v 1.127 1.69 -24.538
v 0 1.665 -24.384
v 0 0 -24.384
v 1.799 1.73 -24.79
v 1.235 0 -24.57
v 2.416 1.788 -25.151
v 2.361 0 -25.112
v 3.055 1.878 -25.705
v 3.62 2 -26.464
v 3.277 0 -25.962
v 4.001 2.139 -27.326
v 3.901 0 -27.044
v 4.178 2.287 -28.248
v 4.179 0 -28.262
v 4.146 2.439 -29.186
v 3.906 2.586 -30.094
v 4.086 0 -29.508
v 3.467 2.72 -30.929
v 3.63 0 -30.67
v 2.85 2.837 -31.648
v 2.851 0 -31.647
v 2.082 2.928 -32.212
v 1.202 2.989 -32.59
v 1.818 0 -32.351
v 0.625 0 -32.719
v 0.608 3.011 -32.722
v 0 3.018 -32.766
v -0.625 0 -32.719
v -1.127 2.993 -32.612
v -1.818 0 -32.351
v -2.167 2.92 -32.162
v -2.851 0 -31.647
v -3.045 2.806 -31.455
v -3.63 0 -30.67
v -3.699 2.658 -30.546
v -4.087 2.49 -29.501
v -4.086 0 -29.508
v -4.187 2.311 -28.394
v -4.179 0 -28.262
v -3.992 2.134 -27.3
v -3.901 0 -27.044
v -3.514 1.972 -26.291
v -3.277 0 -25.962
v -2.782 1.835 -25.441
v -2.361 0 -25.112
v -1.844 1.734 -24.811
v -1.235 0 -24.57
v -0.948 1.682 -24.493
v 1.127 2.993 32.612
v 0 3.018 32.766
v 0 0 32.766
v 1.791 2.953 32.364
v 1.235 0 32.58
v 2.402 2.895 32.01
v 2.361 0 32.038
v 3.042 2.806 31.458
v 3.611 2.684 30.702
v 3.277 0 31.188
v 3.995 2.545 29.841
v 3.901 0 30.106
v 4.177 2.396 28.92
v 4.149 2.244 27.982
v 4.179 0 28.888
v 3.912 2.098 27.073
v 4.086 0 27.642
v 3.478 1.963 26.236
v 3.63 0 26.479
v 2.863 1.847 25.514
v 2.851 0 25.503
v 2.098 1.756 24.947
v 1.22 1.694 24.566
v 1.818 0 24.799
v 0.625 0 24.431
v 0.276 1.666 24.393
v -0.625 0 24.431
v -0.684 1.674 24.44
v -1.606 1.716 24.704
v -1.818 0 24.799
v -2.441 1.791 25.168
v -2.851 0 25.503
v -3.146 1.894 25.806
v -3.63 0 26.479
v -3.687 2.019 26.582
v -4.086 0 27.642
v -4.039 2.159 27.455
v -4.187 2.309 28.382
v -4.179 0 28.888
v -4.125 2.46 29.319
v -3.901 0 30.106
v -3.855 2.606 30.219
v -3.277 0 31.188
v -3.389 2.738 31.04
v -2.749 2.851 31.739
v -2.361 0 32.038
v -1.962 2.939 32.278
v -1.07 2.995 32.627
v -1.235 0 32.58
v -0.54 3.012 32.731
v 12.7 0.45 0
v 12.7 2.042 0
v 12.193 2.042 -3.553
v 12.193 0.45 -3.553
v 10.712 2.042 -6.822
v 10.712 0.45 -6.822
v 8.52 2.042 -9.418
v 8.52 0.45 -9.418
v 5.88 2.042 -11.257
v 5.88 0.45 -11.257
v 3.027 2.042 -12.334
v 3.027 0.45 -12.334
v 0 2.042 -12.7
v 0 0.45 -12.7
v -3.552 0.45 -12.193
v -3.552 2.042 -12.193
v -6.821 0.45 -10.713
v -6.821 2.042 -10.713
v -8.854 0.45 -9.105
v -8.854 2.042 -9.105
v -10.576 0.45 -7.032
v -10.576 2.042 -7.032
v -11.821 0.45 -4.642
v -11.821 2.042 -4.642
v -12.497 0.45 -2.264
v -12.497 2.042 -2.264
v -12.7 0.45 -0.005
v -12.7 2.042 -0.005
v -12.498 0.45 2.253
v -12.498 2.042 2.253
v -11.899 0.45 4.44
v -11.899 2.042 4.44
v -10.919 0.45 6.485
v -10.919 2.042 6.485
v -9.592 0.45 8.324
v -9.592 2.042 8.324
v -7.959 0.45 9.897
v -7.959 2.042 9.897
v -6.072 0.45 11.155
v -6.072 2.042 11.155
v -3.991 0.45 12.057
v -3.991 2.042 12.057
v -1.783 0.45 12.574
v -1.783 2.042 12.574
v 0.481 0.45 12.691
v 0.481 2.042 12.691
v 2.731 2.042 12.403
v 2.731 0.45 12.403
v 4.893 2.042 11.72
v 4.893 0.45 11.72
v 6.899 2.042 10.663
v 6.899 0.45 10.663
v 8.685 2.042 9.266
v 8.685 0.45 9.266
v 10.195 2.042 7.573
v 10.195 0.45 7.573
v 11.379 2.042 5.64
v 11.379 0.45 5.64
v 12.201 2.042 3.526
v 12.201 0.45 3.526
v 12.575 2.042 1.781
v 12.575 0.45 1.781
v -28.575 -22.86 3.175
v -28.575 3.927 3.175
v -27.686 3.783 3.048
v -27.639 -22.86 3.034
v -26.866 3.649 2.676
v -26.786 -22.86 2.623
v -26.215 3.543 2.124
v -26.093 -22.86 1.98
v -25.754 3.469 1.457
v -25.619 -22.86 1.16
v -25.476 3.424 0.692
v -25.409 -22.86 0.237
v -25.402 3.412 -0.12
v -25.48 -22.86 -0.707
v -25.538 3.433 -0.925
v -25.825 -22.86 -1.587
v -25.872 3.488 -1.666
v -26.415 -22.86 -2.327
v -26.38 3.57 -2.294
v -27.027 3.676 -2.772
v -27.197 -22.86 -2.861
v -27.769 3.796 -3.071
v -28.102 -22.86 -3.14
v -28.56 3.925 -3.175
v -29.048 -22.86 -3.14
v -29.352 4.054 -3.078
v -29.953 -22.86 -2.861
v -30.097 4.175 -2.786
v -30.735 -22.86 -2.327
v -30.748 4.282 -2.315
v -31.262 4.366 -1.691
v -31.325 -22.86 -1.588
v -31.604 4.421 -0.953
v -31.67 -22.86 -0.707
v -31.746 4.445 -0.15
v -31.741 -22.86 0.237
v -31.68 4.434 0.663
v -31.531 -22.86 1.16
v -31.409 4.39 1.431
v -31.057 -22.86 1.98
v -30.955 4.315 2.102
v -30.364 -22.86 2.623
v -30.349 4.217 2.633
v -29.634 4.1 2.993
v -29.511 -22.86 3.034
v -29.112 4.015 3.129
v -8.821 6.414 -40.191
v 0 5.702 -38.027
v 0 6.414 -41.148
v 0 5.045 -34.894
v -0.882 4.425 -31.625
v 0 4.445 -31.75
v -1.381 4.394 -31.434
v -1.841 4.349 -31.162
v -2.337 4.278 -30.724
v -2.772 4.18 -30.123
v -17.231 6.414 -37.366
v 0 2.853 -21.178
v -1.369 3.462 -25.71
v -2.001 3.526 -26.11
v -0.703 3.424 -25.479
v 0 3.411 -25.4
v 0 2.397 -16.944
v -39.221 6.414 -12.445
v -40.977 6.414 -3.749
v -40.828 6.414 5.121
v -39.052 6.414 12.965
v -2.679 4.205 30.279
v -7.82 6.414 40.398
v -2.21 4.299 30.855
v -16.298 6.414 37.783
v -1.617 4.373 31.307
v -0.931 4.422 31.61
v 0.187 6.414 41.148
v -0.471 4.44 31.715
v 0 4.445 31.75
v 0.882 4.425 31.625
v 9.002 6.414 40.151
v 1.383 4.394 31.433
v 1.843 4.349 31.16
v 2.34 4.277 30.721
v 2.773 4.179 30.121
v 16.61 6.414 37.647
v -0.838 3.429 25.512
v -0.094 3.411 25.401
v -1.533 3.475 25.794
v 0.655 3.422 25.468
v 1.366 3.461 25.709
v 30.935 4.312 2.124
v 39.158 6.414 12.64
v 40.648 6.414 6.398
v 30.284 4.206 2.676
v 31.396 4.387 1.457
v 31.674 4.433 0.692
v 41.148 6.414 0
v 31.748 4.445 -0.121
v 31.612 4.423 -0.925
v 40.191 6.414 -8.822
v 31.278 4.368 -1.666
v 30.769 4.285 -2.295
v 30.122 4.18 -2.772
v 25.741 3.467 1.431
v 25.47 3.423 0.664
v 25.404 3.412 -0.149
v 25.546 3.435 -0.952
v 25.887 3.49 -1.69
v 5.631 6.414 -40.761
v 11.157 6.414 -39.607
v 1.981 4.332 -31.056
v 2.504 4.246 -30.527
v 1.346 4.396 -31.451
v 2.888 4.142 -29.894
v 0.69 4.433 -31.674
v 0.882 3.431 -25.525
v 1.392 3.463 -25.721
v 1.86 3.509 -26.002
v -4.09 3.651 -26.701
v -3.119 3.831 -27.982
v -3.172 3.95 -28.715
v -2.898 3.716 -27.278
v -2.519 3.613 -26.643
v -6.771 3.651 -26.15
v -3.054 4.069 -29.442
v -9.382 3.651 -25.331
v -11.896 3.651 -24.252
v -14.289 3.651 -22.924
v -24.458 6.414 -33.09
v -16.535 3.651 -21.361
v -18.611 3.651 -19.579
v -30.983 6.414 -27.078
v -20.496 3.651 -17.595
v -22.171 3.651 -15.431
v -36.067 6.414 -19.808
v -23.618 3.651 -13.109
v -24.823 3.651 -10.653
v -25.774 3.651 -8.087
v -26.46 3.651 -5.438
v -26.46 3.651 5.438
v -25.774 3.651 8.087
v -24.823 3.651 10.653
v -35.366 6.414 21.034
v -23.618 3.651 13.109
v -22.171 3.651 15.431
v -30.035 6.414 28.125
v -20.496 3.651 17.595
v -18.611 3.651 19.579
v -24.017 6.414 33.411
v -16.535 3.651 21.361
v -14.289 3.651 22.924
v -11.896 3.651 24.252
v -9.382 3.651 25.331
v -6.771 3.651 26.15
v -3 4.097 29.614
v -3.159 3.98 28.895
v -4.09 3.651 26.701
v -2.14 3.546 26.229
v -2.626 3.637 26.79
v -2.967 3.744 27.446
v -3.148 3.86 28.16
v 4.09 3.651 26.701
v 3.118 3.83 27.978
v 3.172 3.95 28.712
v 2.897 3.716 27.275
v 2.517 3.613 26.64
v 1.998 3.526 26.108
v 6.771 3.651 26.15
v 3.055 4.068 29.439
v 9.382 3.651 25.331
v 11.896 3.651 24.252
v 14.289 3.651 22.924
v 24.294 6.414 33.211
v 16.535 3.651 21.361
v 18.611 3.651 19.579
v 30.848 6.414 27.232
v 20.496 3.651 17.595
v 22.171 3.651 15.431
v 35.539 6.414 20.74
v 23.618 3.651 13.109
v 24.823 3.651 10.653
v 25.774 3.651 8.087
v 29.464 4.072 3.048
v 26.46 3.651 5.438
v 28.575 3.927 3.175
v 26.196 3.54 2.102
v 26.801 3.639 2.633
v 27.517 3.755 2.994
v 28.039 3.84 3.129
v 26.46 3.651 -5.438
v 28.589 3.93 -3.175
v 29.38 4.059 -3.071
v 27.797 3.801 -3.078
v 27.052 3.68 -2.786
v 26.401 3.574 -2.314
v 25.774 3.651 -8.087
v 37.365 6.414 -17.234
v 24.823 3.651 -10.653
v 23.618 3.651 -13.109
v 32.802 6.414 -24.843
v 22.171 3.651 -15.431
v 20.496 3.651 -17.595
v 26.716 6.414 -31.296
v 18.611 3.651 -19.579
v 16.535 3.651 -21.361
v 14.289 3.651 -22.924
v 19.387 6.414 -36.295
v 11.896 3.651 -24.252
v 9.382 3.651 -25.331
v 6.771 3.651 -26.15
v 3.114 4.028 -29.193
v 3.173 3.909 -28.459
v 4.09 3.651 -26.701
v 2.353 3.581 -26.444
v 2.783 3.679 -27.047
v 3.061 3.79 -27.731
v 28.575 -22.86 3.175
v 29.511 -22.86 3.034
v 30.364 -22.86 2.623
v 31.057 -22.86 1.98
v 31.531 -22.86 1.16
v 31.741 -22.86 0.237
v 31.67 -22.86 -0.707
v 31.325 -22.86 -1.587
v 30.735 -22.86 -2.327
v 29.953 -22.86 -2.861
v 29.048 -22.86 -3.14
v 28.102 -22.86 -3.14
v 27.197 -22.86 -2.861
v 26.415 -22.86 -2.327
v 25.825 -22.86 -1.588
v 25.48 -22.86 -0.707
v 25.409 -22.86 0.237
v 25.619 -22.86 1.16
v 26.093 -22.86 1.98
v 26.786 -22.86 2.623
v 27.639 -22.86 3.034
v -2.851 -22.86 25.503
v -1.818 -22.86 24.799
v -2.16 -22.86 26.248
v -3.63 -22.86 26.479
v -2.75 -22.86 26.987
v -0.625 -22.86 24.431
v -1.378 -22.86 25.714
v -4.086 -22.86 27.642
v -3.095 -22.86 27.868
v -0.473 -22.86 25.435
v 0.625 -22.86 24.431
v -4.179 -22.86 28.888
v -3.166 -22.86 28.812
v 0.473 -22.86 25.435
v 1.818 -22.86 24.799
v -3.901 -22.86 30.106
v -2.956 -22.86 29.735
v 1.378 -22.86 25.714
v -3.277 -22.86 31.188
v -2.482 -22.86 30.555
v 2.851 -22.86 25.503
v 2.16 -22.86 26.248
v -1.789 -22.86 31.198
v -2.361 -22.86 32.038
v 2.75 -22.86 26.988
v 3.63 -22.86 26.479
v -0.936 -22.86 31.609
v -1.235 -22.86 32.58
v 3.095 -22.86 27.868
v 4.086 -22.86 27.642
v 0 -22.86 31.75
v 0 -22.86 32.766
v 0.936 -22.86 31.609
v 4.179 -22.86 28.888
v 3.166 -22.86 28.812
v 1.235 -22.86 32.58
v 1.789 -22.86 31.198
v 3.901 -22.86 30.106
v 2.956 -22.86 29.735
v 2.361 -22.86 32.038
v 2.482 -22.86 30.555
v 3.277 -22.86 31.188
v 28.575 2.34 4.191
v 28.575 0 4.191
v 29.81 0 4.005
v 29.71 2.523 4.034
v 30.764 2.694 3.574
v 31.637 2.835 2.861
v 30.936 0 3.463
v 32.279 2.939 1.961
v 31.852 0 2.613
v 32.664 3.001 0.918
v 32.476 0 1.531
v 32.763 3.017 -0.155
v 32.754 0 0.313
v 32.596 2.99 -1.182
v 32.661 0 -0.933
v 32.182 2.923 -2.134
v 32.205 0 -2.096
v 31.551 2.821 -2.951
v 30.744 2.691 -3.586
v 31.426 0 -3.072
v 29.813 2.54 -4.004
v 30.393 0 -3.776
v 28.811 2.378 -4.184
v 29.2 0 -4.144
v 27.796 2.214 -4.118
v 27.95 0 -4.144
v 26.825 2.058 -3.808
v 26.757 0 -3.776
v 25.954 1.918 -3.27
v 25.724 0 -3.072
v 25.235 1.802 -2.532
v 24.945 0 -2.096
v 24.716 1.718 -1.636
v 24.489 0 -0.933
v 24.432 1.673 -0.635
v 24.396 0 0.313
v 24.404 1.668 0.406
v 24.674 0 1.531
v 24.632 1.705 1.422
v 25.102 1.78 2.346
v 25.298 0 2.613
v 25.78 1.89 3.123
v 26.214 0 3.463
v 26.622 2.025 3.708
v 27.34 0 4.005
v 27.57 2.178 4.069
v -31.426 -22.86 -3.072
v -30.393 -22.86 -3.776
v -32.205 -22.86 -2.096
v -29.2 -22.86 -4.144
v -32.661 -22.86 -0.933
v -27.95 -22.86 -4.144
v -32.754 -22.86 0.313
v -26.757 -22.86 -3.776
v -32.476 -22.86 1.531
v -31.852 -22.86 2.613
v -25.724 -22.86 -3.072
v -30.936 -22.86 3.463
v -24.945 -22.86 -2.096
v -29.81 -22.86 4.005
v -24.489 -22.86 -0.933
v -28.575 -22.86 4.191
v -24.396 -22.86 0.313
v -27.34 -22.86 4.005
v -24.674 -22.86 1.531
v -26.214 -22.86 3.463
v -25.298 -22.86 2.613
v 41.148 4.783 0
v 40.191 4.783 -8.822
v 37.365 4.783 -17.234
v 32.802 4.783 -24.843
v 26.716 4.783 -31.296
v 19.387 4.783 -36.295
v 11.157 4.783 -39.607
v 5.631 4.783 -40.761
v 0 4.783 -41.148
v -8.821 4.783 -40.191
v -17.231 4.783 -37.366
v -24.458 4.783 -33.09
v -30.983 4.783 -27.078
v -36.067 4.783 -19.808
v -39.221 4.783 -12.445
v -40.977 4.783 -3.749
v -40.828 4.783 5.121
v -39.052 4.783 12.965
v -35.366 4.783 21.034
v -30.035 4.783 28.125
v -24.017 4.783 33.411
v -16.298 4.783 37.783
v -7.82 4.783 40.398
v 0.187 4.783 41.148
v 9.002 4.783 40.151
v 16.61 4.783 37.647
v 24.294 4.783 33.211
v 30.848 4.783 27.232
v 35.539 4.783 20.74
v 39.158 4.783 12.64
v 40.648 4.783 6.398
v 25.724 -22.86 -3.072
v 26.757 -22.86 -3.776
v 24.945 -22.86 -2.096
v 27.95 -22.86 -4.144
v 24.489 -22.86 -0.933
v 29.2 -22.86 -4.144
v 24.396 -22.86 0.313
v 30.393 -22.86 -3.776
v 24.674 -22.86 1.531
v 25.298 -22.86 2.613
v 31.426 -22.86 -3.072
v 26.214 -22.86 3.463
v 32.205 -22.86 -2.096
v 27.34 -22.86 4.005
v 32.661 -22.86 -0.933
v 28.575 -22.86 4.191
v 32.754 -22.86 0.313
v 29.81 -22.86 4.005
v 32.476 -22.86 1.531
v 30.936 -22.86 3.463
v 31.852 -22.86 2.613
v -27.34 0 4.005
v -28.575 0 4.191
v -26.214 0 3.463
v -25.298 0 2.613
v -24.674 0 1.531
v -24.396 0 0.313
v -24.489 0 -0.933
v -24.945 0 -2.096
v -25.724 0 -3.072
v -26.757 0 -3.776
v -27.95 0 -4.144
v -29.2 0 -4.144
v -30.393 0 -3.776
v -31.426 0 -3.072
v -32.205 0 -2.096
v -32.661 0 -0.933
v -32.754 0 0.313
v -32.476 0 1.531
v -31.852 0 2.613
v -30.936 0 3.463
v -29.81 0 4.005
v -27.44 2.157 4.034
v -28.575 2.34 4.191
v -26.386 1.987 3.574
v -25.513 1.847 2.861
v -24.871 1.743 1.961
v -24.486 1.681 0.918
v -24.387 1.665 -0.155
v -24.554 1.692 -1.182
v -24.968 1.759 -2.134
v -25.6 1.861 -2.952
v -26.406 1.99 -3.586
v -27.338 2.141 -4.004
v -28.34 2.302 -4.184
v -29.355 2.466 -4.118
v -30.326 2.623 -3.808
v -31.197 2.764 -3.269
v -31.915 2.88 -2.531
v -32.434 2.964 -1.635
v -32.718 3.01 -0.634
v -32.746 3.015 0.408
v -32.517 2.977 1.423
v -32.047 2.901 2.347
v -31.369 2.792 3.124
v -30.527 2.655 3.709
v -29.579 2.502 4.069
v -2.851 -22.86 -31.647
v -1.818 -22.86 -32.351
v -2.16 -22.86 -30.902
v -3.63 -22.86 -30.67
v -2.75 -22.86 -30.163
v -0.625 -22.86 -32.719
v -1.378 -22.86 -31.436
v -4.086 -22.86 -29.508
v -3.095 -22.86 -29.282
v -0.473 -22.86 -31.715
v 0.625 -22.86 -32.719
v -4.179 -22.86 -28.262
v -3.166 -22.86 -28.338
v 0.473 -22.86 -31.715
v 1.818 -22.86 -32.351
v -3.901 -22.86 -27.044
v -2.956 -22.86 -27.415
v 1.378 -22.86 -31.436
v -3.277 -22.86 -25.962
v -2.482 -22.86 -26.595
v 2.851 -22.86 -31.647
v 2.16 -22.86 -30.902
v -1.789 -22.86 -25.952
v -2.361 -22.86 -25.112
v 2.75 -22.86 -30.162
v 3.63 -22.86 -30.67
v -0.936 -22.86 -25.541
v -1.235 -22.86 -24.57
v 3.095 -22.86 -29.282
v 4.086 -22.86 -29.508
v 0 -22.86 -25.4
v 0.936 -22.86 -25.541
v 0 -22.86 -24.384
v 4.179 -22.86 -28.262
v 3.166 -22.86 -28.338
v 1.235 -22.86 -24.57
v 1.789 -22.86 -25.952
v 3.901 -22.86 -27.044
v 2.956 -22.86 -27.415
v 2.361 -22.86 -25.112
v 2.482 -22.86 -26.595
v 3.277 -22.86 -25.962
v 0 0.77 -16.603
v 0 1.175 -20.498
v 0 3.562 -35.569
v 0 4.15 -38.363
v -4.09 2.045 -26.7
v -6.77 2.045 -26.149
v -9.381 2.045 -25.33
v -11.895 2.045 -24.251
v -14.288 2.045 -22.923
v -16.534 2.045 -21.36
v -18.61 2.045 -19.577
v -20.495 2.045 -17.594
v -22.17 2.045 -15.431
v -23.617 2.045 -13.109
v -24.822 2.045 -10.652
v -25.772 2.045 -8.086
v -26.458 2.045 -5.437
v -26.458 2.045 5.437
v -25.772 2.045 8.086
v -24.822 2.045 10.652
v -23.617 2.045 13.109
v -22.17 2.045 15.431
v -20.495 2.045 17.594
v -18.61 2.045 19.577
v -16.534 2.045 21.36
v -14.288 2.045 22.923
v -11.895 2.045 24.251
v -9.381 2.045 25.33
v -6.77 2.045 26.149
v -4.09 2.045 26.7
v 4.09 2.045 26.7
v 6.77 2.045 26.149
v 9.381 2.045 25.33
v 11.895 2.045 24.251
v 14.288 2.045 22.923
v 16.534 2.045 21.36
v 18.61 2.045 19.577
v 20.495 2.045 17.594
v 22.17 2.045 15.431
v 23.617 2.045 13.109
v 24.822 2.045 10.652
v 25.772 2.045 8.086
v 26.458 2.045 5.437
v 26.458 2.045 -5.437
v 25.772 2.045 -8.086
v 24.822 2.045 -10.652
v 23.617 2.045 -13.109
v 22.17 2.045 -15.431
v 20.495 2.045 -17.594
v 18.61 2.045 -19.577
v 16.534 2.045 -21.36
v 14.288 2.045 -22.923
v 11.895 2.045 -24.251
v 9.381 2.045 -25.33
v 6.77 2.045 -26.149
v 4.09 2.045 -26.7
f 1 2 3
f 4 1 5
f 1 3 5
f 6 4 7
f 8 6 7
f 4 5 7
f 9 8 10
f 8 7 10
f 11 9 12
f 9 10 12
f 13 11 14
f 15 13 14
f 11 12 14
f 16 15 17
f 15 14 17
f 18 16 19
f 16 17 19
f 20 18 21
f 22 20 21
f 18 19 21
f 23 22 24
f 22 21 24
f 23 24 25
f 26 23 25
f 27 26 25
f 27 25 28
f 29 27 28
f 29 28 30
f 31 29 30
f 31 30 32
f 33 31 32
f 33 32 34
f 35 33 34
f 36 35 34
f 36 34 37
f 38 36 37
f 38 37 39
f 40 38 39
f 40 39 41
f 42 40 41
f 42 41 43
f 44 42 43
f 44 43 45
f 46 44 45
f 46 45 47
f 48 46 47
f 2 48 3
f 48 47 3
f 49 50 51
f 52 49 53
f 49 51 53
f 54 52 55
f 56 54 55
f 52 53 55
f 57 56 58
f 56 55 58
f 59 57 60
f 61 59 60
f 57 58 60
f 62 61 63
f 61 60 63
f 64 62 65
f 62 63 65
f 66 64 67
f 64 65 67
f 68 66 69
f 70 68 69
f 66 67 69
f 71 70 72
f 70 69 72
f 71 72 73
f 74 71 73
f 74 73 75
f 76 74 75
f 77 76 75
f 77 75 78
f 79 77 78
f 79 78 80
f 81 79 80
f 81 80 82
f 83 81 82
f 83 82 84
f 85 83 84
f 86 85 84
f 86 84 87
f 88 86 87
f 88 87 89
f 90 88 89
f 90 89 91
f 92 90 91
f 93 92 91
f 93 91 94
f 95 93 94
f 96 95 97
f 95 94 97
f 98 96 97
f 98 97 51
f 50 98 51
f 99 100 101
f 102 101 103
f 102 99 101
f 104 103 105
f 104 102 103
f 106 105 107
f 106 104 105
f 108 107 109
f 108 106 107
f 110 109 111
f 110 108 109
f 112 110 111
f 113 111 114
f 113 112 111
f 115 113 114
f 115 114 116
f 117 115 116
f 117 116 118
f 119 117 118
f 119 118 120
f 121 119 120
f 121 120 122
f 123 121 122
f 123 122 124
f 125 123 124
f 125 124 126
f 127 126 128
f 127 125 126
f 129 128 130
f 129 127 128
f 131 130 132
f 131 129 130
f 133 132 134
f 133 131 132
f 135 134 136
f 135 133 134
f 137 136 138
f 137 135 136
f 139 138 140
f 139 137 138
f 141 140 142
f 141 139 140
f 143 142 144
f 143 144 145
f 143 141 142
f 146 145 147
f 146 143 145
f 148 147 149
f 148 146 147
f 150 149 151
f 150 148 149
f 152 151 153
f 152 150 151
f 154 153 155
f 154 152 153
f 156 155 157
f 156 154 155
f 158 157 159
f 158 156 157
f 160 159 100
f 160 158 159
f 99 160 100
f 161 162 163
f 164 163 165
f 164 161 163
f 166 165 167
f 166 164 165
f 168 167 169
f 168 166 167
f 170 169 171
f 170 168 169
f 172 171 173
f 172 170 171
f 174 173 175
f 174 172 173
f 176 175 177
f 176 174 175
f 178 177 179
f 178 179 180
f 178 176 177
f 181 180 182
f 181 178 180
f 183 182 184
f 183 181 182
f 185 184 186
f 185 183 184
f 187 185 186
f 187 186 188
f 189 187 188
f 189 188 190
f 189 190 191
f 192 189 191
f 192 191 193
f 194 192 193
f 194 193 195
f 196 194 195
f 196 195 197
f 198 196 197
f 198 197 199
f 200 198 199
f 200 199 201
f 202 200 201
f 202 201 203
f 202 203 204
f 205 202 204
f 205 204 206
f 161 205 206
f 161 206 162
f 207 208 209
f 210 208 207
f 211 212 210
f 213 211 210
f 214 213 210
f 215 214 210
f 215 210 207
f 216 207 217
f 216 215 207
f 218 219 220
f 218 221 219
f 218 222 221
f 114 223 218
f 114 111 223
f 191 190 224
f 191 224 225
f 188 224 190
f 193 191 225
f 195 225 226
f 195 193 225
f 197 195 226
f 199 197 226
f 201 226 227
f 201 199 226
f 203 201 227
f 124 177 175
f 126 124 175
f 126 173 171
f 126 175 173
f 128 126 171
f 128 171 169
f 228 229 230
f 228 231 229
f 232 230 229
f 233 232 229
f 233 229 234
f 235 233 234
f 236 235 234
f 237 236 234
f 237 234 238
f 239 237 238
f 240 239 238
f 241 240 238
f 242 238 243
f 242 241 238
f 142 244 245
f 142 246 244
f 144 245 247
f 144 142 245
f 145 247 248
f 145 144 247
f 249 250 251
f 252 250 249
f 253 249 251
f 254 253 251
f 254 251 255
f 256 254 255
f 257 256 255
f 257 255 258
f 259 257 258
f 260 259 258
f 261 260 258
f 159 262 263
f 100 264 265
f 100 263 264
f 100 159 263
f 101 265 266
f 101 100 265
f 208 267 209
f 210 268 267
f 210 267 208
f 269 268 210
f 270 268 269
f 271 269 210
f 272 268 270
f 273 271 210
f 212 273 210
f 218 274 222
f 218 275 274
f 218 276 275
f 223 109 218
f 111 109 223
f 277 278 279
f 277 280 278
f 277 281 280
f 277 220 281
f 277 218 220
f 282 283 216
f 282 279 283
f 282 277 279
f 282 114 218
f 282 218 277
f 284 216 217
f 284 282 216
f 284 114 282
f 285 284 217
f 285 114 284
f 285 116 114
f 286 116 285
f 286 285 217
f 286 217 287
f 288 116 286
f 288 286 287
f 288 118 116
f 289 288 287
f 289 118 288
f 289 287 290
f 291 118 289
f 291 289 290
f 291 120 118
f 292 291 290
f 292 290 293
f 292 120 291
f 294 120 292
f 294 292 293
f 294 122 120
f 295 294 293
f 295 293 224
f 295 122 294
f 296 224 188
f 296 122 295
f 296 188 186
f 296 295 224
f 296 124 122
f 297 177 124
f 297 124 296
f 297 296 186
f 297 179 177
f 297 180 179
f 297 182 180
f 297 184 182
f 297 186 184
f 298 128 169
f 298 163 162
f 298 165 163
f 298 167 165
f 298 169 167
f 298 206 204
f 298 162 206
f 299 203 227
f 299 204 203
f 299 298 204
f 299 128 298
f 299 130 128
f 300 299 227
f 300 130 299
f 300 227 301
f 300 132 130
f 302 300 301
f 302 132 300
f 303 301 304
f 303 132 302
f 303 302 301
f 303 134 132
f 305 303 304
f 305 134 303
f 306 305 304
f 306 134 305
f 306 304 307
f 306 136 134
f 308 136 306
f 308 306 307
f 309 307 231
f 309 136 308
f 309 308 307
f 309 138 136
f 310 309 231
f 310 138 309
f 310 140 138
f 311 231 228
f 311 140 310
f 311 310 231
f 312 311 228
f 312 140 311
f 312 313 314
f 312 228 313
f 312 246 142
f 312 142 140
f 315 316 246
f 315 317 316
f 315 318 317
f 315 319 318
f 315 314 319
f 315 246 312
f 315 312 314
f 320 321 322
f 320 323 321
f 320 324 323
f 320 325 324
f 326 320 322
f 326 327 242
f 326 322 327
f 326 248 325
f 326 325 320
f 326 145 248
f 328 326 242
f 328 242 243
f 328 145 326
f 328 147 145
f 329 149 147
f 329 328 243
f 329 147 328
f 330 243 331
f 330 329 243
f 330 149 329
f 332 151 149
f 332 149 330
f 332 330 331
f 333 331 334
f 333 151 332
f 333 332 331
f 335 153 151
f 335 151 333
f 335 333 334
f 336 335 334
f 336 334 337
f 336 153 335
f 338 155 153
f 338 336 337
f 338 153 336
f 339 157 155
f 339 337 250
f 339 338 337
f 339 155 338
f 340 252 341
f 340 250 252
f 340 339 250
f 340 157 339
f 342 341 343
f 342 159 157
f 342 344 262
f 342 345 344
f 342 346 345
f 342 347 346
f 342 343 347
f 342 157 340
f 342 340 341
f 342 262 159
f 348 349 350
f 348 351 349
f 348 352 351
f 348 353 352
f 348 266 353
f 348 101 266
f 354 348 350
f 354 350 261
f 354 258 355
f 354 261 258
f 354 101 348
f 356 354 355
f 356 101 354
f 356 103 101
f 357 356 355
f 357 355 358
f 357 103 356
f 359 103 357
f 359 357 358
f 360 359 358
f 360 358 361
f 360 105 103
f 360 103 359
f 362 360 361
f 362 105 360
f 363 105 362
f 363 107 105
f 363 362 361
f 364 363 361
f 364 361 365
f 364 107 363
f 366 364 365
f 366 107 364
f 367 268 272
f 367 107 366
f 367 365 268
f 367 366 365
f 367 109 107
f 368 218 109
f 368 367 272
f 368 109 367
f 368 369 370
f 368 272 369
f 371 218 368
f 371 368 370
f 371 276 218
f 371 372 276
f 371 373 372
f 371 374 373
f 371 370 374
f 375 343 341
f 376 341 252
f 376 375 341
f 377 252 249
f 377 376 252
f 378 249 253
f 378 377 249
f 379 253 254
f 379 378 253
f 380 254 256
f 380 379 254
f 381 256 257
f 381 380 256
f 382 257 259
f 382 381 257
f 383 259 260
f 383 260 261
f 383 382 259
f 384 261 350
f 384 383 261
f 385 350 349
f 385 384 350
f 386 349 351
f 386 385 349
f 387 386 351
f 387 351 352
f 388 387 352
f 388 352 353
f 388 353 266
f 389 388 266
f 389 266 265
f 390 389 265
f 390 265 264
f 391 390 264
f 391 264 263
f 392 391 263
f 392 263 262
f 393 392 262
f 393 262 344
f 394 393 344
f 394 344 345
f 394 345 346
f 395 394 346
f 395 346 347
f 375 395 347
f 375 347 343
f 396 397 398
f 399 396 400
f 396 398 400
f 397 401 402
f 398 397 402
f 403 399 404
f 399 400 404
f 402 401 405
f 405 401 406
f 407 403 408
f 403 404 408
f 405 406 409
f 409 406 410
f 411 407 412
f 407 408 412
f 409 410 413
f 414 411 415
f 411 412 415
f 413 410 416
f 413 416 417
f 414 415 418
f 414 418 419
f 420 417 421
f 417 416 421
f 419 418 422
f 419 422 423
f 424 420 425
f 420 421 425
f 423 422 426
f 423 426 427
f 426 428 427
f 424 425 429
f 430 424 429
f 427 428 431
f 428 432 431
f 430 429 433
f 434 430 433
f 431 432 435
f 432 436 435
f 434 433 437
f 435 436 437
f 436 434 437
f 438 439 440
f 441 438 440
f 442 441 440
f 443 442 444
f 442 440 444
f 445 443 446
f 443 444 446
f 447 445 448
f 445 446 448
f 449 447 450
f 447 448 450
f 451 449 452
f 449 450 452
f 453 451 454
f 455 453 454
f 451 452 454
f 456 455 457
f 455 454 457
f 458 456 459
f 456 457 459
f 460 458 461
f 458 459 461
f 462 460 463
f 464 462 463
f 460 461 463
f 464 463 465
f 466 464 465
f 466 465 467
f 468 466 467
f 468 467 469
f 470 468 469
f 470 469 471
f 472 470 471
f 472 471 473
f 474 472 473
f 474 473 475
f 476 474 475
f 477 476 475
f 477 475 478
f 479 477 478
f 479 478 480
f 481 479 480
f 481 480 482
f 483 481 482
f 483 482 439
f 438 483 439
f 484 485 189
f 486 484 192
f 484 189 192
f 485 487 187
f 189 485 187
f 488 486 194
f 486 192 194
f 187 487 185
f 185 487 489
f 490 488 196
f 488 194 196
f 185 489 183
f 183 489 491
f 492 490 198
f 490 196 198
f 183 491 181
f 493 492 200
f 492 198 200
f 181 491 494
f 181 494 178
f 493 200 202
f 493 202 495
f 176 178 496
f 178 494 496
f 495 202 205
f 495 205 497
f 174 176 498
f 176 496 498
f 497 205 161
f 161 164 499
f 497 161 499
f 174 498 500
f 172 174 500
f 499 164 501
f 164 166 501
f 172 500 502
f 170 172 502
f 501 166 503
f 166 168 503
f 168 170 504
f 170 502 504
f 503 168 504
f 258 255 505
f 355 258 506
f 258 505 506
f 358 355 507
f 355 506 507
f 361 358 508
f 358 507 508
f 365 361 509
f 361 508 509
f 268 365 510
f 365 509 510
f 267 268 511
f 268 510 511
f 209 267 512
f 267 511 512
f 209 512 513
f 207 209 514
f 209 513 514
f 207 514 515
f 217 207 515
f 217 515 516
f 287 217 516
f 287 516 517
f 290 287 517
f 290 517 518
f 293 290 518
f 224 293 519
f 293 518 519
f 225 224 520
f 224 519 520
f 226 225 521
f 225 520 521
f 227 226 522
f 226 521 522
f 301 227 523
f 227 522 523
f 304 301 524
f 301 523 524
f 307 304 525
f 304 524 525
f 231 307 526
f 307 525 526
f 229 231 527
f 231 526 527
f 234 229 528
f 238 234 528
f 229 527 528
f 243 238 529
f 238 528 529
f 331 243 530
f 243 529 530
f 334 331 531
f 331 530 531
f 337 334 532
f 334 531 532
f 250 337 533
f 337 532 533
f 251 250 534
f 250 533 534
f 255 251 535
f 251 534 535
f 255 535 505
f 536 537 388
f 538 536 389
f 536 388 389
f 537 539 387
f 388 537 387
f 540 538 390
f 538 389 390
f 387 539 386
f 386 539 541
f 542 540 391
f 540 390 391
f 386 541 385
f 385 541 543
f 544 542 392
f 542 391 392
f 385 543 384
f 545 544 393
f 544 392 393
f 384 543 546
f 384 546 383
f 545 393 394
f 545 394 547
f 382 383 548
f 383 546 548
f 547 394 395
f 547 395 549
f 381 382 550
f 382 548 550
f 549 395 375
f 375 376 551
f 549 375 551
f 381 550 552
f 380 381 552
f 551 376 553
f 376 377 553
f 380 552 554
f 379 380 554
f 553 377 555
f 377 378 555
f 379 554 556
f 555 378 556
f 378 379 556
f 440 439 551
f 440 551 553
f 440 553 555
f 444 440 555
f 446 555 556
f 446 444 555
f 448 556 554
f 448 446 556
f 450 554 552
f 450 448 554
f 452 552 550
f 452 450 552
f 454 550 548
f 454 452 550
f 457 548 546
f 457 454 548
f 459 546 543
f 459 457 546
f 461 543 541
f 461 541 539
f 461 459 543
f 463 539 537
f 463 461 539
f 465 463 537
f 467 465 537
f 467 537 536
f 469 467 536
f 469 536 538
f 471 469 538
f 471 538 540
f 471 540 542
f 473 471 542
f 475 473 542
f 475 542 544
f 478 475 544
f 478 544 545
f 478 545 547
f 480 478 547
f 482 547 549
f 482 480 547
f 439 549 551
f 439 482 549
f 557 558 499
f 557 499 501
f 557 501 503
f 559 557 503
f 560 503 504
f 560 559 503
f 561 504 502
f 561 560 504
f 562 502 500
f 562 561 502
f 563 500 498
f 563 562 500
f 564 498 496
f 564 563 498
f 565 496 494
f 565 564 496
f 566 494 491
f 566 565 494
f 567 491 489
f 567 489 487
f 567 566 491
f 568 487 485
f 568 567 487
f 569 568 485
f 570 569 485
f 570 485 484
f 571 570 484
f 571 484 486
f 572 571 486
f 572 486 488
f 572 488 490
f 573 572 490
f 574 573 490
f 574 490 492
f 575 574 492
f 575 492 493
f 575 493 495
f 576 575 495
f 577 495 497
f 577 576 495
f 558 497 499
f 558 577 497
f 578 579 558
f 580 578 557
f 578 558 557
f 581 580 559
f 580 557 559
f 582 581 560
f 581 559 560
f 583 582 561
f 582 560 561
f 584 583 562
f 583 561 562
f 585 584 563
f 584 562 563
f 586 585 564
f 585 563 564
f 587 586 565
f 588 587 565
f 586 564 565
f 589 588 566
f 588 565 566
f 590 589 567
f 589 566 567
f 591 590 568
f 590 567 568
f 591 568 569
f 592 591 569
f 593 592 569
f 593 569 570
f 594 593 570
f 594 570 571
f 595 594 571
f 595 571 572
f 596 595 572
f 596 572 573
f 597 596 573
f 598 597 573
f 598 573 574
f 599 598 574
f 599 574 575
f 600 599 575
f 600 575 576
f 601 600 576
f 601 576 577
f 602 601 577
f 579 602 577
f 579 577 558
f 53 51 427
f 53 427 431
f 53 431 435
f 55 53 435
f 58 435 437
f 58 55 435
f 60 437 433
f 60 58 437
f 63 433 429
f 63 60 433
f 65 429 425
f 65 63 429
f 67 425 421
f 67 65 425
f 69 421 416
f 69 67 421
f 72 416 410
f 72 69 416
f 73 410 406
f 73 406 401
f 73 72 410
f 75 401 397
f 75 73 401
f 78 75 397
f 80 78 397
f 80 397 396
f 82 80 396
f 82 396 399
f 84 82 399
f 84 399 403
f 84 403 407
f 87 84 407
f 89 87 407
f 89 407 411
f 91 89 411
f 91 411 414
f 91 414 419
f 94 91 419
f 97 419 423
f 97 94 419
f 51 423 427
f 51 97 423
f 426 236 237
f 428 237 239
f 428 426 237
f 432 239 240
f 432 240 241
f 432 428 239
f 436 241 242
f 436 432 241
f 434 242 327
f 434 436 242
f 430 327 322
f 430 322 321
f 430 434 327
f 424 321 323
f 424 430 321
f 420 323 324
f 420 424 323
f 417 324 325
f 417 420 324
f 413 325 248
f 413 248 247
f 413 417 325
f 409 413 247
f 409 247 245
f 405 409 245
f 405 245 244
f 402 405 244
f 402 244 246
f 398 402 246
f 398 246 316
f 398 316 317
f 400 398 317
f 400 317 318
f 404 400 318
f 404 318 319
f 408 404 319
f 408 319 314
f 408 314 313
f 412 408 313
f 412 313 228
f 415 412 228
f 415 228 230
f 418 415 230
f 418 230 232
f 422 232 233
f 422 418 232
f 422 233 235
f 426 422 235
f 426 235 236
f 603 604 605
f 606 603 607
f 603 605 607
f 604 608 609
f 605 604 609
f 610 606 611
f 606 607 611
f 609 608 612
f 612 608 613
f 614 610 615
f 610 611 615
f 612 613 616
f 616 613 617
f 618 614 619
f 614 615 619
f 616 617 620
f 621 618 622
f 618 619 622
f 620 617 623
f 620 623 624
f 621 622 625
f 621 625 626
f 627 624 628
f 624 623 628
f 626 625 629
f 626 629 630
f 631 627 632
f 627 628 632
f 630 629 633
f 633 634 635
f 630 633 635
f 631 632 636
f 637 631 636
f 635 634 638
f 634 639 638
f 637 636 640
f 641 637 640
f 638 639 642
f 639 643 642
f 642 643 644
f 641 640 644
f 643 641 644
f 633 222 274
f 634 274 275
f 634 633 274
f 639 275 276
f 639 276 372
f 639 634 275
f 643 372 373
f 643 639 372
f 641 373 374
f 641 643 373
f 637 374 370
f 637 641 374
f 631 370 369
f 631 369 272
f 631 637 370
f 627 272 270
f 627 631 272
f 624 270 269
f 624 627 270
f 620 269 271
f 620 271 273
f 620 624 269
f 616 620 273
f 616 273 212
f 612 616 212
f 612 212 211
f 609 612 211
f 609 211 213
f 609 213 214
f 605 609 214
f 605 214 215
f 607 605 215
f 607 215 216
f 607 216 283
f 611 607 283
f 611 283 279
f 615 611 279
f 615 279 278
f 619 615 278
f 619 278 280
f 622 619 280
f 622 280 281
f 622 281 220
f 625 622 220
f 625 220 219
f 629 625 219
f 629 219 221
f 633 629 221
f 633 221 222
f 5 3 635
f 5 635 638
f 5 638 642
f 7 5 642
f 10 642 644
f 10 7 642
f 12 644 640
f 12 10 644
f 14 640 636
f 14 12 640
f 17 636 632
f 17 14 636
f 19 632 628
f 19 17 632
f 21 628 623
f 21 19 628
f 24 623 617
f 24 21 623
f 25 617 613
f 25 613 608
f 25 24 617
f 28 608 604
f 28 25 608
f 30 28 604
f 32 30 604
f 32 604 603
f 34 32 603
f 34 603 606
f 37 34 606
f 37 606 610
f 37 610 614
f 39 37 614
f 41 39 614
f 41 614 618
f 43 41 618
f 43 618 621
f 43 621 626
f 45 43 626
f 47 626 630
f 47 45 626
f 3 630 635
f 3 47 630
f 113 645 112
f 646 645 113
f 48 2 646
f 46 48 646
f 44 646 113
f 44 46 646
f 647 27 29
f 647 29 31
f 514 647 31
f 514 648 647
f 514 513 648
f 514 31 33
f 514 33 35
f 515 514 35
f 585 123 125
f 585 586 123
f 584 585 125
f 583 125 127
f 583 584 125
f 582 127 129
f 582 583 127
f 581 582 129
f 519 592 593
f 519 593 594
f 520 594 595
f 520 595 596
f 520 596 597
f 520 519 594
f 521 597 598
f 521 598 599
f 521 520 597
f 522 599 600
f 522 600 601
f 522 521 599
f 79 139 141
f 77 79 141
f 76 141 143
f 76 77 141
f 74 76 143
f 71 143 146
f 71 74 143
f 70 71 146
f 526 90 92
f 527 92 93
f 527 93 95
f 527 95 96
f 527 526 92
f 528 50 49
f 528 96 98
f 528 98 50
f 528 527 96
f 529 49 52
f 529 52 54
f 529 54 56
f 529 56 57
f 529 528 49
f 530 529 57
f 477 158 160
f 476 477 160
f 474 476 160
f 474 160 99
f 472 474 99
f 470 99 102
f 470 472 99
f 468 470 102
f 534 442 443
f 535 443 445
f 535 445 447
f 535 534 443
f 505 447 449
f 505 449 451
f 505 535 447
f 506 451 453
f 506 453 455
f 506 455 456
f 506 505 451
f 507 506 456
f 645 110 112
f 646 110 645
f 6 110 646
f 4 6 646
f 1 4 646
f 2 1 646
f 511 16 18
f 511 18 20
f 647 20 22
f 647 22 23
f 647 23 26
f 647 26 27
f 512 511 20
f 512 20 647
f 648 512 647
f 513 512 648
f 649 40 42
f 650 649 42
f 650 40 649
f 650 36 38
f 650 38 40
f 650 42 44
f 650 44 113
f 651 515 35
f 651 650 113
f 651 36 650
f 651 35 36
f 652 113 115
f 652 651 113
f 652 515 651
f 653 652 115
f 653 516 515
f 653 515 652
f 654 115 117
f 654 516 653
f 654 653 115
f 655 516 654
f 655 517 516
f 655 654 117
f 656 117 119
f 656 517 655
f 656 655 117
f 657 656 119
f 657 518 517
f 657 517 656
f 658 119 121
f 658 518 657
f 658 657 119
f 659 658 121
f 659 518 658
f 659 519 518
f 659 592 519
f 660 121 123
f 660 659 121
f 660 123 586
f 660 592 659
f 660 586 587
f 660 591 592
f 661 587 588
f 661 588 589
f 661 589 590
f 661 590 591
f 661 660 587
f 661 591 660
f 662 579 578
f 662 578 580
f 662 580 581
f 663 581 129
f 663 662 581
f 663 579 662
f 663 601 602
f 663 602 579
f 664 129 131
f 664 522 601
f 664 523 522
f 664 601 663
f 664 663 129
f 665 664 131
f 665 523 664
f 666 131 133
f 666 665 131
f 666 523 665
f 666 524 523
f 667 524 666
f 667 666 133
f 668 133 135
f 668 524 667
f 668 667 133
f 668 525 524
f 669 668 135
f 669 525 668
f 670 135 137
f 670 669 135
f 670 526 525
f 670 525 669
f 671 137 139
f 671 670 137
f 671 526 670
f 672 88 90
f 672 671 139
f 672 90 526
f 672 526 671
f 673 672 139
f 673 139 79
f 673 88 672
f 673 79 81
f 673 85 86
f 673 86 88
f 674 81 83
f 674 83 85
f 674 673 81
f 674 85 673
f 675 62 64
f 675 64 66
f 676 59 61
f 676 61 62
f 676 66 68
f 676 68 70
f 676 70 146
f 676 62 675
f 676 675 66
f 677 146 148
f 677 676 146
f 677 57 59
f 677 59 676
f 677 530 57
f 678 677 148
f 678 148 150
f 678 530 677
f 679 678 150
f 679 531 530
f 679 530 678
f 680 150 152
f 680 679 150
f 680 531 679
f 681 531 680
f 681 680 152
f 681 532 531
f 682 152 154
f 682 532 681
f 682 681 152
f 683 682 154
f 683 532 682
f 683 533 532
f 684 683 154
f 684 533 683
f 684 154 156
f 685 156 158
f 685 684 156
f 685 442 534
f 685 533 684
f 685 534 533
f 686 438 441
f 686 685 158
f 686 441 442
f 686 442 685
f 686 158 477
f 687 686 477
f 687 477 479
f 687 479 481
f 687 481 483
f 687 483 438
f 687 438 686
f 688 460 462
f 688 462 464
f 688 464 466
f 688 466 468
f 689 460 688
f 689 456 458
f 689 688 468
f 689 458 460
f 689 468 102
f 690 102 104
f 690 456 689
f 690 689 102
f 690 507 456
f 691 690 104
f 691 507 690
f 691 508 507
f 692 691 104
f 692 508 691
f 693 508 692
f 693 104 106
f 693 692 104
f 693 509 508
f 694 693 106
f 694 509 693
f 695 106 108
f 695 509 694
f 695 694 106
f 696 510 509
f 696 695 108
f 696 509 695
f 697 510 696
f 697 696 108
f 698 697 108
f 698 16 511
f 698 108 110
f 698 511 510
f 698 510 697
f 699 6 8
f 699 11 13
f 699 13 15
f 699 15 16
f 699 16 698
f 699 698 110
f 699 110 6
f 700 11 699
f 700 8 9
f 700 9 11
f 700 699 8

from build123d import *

# Parameters (mm, degrees)
BOSS_EXTRUDE2_REACH             = 105.962
BOSS_EXTRUDE2_END_RADIUS        = 179.3875
SKETCH2_R                       = 4.191
SKETCH2_R_2                     = 3.175
BOSS_EXTRUDE2_DIRECTION_2_DEPTH = 22.86
SKETCH2_6_R                     = 72.587717307
SKETCH2_6_R_2                   = 41.148
SKETCH2_6_R_3                   = 12.7
CUT_EXTRUDE3_DEPTH              = 106.169068821
CUT_EXTRUDE4_DEPTH              = 63.521159814
CUT_EXTRUDE4_DEPTH_BACK         = 63.521159814
SKETCH2_8_R                     = 3.175


with BuildPart() as part:
    # Sketch1 → Revolve1 (revolve)
    with BuildSketch(Plane.XY, mode=Mode.PRIVATE) as revolve1_sk:
        with BuildLine():
            Line((0, 1.5875), (0, 0))
            ThreePointArc((0, 0), (-37.095674447, 3.877425948), (-72.587717307, 15.342084177))
            Line((-72.587717307, 15.342084177), (-71.138583931, 16.439220241))
            ThreePointArc((-71.138583931, 16.439220241), (-36.336179346, 5.340029261), (0, 1.5875))
        make_face()
    revolve(revolve1_sk.sketch.rotate(Axis((0, 0, 0), (0, 1, 0)), 270), axis=Axis((0, 0, 0), (0, 1, 0)))

    # Boss-Extrude2: up to this sphere (the profile starts outside it)
    boss_extrude2_end = Location((0, 179.3875, 0)) * Sphere(BOSS_EXTRUDE2_END_RADIUS, mode=Mode.PRIVATE)
    # Sketch2 → Boss-Extrude2 (add, up to the surface)
    with BuildSketch(Plane(origin=(0, 0, 0), x_dir=(1, 0, 0), z_dir=(0, 1, 0)), mode=Mode.PRIVATE) as boss_extrude2_sk1:
        with Locations(Location((-28.575, 0, 0), (0, 0, 270))):
            Circle(SKETCH2_R)
        with Locations((-28.575, 0)):
            Circle(SKETCH2_R_2, mode=Mode.SUBTRACT)
    boss_extrude2_tool1 = extrude(boss_extrude2_sk1.sketch, amount=BOSS_EXTRUDE2_REACH, mode=Mode.PRIVATE) - boss_extrude2_end
    add(boss_extrude2_tool1.solids().sort_by_distance((-28.575, 0, -4.072461))[0])
    # Sketch2 → Boss-Extrude2 (add, up to the surface)
    with BuildSketch(Plane(origin=(0, 0, 0), x_dir=(1, 0, 0), z_dir=(0, 1, 0)), mode=Mode.PRIVATE) as boss_extrude2_sk2:
        with Locations((-28.575, 0)):
            Circle(SKETCH2_R_2)
    boss_extrude2_tool2 = extrude(boss_extrude2_sk2.sketch, amount=BOSS_EXTRUDE2_REACH, mode=Mode.PRIVATE) - boss_extrude2_end
    add(boss_extrude2_tool2.solids().sort_by_distance((-28.575, 0, 0))[0])
    # Sketch2 → Boss-Extrude2 (add, up to the surface)
    with BuildSketch(Plane(origin=(0, 0, 0), x_dir=(1, 0, 0), z_dir=(0, 1, 0)), mode=Mode.PRIVATE) as boss_extrude2_sk3:
        with Locations(Location((0, 28.575, 0), (0, 0, 270))):
            Circle(SKETCH2_R)
        with Locations((0, 28.575)):
            Circle(SKETCH2_R_2, mode=Mode.SUBTRACT)
    boss_extrude2_tool3 = extrude(boss_extrude2_sk3.sketch, amount=BOSS_EXTRUDE2_REACH, mode=Mode.PRIVATE) - boss_extrude2_end
    add(boss_extrude2_tool3.solids().sort_by_distance((0, 0, -32.647461))[0])
    # Sketch2 → Boss-Extrude2 (add, up to the surface)
    with BuildSketch(Plane(origin=(0, 0, 0), x_dir=(1, 0, 0), z_dir=(0, 1, 0)), mode=Mode.PRIVATE) as boss_extrude2_sk4:
        with Locations((0, 28.575)):
            Circle(SKETCH2_R_2)
    boss_extrude2_tool4 = extrude(boss_extrude2_sk4.sketch, amount=BOSS_EXTRUDE2_REACH, mode=Mode.PRIVATE) - boss_extrude2_end
    add(boss_extrude2_tool4.solids().sort_by_distance((0, 0, -28.575))[0])
    # Sketch2 → Boss-Extrude2 (add, up to the surface)
    with BuildSketch(Plane(origin=(0, 0, 0), x_dir=(1, 0, 0), z_dir=(0, 1, 0)), mode=Mode.PRIVATE) as boss_extrude2_sk5:
        with Locations(Location((28.575, 0, 0), (0, 0, 270))):
            Circle(SKETCH2_R)
        with Locations((28.575, 0)):
            Circle(SKETCH2_R_2, mode=Mode.SUBTRACT)
    boss_extrude2_tool5 = extrude(boss_extrude2_sk5.sketch, amount=BOSS_EXTRUDE2_REACH, mode=Mode.PRIVATE) - boss_extrude2_end
    add(boss_extrude2_tool5.solids().sort_by_distance((28.575, 0, -4.072461))[0])
    # Sketch2 → Boss-Extrude2 (add, up to the surface)
    with BuildSketch(Plane(origin=(0, 0, 0), x_dir=(1, 0, 0), z_dir=(0, 1, 0)), mode=Mode.PRIVATE) as boss_extrude2_sk6:
        with Locations((28.575, 0)):
            Circle(SKETCH2_R_2)
    boss_extrude2_tool6 = extrude(boss_extrude2_sk6.sketch, amount=BOSS_EXTRUDE2_REACH, mode=Mode.PRIVATE) - boss_extrude2_end
    add(boss_extrude2_tool6.solids().sort_by_distance((28.575, 0, 0))[0])
    # Sketch2 → Boss-Extrude2 (add, up to the surface)
    with BuildSketch(Plane(origin=(0, 0, 0), x_dir=(1, 0, 0), z_dir=(0, 1, 0)), mode=Mode.PRIVATE) as boss_extrude2_sk7:
        with Locations(Location((0, -28.575, 0), (0, 0, 270))):
            Circle(SKETCH2_R)
        with Locations((0, -28.575)):
            Circle(SKETCH2_R_2, mode=Mode.SUBTRACT)
    boss_extrude2_tool7 = extrude(boss_extrude2_sk7.sketch, amount=BOSS_EXTRUDE2_REACH, mode=Mode.PRIVATE) - boss_extrude2_end
    add(boss_extrude2_tool7.solids().sort_by_distance((0, 0, 24.502539))[0])
    # Sketch2 → Boss-Extrude2 (add, up to the surface)
    with BuildSketch(Plane(origin=(0, 0, 0), x_dir=(1, 0, 0), z_dir=(0, 1, 0)), mode=Mode.PRIVATE) as boss_extrude2_sk8:
        with Locations((0, -28.575)):
            Circle(SKETCH2_R_2)
    boss_extrude2_tool8 = extrude(boss_extrude2_sk8.sketch, amount=BOSS_EXTRUDE2_REACH, mode=Mode.PRIVATE) - boss_extrude2_end
    add(boss_extrude2_tool8.solids().sort_by_distance((0, 0, 28.575))[0])

    # Sketch2 → Boss-Extrude2 direction 2 (add)
    # profile 1 of 8: a face of its own
    with BuildSketch(Plane(origin=(0, 0, 0), x_dir=(1, 0, 0), z_dir=(0, 1, 0))):
        with Locations(Location((-28.575, 0, 0), (0, 0, 270))):
            Circle(SKETCH2_R)
        with Locations((-28.575, 0)):
            Circle(SKETCH2_R_2, mode=Mode.SUBTRACT)
    # profile 2 of 8: a face of its own
    with BuildSketch(Plane(origin=(0, 0, 0), x_dir=(1, 0, 0), z_dir=(0, 1, 0))):
        with Locations((-28.575, 0)):
            Circle(SKETCH2_R_2)
    # profile 3 of 8: a face of its own
    with BuildSketch(Plane(origin=(0, 0, 0), x_dir=(1, 0, 0), z_dir=(0, 1, 0))):
        with Locations(Location((0, 28.575, 0), (0, 0, 270))):
            Circle(SKETCH2_R)
        with Locations((0, 28.575)):
            Circle(SKETCH2_R_2, mode=Mode.SUBTRACT)
    # profile 4 of 8: a face of its own
    with BuildSketch(Plane(origin=(0, 0, 0), x_dir=(1, 0, 0), z_dir=(0, 1, 0))):
        with Locations((0, 28.575)):
            Circle(SKETCH2_R_2)
    # profile 5 of 8: a face of its own
    with BuildSketch(Plane(origin=(0, 0, 0), x_dir=(1, 0, 0), z_dir=(0, 1, 0))):
        with Locations(Location((28.575, 0, 0), (0, 0, 270))):
            Circle(SKETCH2_R)
        with Locations((28.575, 0)):
            Circle(SKETCH2_R_2, mode=Mode.SUBTRACT)
    # profile 6 of 8: a face of its own
    with BuildSketch(Plane(origin=(0, 0, 0), x_dir=(1, 0, 0), z_dir=(0, 1, 0))):
        with Locations((28.575, 0)):
            Circle(SKETCH2_R_2)
    # profile 7 of 8: a face of its own
    with BuildSketch(Plane(origin=(0, 0, 0), x_dir=(1, 0, 0), z_dir=(0, 1, 0))):
        with Locations(Location((0, -28.575, 0), (0, 0, 270))):
            Circle(SKETCH2_R)
        with Locations((0, -28.575)):
            Circle(SKETCH2_R_2, mode=Mode.SUBTRACT)
    # profile 8 of 8: a face of its own
    with BuildSketch(Plane(origin=(0, 0, 0), x_dir=(1, 0, 0), z_dir=(0, 1, 0))):
        with Locations((0, -28.575)):
            Circle(SKETCH2_R_2)
    extrude(amount=-BOSS_EXTRUDE2_DIRECTION_2_DEPTH)

    # Sketch2<6> → Cut-Extrude3 (cut, through all)
    # profile 1 of 2: a face of its own
    with BuildSketch(Plane(origin=(0, 0, 0), x_dir=(1, 0, 0), z_dir=(0, 1, 0))):
        Circle(SKETCH2_6_R)
        Circle(SKETCH2_6_R_2, mode=Mode.SUBTRACT)
    # profile 2 of 2: a face of its own
    with BuildSketch(Plane(origin=(0, 0, 0), x_dir=(1, 0, 0), z_dir=(0, 1, 0))):
        Circle(SKETCH2_6_R_3)
    extrude(amount=CUT_EXTRUDE3_DEPTH, mode=Mode.SUBTRACT)


with BuildPart() as cut_extrude3_kept_piece:
    # of the separate pieces the step leaves, the one the design keeps (cut_extrude3_pieces_kept)
    add(part.part.solids().sort_by_distance((41.148, 6.414432455, 0))[0])

    # Sketch2<8> → Cut-Extrude4 (cut, two sides: drawn at the far end of the back side and taken through both)
    with BuildSketch(Plane(origin=(0, 0, 0), x_dir=(1, 0, 0), z_dir=(0, 1, 0)).offset(-CUT_EXTRUDE4_DEPTH_BACK)):
        with Locations(Location((-28.575, 0, 0), (0, 0, 270))):
            Circle(SKETCH2_8_R)
        with Locations(Location((0, 28.575, 0), (0, 0, 270))):
            Circle(SKETCH2_8_R)
        with Locations(Location((28.575, 0, 0), (0, 0, 270))):
            Circle(SKETCH2_8_R)
        with Locations(Location((0, -28.575, 0), (0, 0, 270))):
            Circle(SKETCH2_8_R)
    extrude(amount=CUT_EXTRUDE4_DEPTH + CUT_EXTRUDE4_DEPTH_BACK, mode=Mode.SUBTRACT)


solid = cut_extrude3_kept_piece.part
